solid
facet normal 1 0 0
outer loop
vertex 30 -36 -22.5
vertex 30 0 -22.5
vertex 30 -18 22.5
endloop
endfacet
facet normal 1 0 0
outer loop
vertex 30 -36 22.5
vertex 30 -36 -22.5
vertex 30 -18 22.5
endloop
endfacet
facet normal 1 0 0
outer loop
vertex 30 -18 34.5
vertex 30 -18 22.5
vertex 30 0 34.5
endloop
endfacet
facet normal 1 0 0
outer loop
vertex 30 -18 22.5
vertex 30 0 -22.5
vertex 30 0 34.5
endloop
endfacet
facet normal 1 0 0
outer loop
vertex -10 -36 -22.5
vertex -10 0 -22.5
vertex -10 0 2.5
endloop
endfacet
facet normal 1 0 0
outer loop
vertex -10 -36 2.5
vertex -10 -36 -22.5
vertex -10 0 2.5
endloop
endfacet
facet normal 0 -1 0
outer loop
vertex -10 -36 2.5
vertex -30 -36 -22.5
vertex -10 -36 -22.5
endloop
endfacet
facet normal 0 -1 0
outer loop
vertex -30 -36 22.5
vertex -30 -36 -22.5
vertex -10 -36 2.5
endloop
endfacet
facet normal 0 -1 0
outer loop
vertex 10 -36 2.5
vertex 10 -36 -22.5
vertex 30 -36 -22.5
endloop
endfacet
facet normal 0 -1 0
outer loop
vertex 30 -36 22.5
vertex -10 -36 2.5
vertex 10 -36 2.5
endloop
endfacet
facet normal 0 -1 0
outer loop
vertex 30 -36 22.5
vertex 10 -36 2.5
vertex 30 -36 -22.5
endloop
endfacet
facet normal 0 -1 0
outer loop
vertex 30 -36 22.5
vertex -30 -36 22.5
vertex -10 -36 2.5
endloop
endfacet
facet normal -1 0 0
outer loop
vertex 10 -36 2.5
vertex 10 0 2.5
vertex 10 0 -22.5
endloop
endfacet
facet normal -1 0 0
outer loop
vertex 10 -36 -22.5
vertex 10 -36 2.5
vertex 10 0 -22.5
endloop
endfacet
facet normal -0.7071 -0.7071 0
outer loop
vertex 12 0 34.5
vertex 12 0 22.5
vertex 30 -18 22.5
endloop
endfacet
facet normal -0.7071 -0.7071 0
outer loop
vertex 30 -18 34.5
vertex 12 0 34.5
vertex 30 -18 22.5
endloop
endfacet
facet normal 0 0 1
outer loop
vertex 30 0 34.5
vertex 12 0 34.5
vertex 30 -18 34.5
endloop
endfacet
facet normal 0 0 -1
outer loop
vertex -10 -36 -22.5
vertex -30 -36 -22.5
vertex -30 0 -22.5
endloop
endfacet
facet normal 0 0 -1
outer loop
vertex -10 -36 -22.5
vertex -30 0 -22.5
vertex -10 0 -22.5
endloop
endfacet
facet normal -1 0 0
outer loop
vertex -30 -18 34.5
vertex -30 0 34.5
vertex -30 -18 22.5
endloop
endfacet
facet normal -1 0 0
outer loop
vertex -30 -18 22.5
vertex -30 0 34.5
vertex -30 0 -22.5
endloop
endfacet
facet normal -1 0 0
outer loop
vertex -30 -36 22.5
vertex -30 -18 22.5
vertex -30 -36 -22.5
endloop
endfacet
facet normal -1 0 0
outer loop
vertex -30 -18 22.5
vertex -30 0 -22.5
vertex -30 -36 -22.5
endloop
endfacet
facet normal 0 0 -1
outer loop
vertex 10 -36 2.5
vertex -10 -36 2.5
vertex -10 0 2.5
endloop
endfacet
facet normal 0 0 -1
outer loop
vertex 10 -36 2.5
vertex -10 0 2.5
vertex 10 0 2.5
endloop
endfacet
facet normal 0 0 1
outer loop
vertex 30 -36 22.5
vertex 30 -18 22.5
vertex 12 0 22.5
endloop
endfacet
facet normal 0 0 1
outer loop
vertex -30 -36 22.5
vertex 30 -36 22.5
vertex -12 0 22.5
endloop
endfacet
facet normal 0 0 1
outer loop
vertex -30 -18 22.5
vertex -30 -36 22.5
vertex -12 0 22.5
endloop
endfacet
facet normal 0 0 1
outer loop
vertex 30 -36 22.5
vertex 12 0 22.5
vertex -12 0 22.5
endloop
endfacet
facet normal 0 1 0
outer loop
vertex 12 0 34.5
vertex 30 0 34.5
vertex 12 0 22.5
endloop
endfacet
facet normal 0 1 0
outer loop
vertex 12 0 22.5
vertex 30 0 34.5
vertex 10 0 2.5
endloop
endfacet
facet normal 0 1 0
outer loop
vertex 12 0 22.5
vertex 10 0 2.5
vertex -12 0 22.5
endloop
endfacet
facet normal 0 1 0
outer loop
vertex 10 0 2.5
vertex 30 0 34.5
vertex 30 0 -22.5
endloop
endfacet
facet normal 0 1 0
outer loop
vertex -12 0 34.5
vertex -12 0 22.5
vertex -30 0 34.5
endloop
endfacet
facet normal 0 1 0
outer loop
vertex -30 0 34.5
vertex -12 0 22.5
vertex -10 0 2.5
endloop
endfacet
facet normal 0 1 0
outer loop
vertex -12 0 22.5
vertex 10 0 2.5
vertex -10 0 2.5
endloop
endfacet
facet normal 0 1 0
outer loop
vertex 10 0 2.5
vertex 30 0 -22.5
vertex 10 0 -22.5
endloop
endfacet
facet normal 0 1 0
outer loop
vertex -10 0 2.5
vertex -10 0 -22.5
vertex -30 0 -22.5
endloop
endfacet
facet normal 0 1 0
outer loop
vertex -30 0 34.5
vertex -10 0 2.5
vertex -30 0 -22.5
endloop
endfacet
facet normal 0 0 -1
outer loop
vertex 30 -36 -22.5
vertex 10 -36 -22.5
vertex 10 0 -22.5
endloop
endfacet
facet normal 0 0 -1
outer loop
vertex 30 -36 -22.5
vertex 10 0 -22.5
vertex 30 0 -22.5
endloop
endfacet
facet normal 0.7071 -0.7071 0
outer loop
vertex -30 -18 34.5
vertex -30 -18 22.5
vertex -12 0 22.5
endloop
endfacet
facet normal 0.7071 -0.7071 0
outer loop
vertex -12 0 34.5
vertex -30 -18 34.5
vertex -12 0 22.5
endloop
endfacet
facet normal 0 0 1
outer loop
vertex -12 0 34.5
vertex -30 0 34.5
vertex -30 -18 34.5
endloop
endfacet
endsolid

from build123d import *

# Parameters (mm, degrees)
F1_DEPTH = 36
F3_DEPTH = 12


with BuildPart() as f1:
    # F0 (on Front) → F1 (new body)
    with BuildSketch(Plane.XZ):
        Polygon((-30, 22.5), (-30, -22.5), (-10, -22.5), (-10, 2.5), (10, 2.5), (10, -22.5), (30, -22.5), (30, 22.5), (10, 22.5), (-10, 22.5), align=None)
    extrude(amount=F1_DEPTH)

    # F2 (on face) → F3 (join)
    with BuildSketch(Plane.XY.offset(22.5)):
        Polygon((-30, -18), (-12, 0), (-30, 0), align=None)
        Polygon((30, 0), (12, 0), (30, -18), align=None)
    extrude(amount=F3_DEPTH)


solid = f1.part
